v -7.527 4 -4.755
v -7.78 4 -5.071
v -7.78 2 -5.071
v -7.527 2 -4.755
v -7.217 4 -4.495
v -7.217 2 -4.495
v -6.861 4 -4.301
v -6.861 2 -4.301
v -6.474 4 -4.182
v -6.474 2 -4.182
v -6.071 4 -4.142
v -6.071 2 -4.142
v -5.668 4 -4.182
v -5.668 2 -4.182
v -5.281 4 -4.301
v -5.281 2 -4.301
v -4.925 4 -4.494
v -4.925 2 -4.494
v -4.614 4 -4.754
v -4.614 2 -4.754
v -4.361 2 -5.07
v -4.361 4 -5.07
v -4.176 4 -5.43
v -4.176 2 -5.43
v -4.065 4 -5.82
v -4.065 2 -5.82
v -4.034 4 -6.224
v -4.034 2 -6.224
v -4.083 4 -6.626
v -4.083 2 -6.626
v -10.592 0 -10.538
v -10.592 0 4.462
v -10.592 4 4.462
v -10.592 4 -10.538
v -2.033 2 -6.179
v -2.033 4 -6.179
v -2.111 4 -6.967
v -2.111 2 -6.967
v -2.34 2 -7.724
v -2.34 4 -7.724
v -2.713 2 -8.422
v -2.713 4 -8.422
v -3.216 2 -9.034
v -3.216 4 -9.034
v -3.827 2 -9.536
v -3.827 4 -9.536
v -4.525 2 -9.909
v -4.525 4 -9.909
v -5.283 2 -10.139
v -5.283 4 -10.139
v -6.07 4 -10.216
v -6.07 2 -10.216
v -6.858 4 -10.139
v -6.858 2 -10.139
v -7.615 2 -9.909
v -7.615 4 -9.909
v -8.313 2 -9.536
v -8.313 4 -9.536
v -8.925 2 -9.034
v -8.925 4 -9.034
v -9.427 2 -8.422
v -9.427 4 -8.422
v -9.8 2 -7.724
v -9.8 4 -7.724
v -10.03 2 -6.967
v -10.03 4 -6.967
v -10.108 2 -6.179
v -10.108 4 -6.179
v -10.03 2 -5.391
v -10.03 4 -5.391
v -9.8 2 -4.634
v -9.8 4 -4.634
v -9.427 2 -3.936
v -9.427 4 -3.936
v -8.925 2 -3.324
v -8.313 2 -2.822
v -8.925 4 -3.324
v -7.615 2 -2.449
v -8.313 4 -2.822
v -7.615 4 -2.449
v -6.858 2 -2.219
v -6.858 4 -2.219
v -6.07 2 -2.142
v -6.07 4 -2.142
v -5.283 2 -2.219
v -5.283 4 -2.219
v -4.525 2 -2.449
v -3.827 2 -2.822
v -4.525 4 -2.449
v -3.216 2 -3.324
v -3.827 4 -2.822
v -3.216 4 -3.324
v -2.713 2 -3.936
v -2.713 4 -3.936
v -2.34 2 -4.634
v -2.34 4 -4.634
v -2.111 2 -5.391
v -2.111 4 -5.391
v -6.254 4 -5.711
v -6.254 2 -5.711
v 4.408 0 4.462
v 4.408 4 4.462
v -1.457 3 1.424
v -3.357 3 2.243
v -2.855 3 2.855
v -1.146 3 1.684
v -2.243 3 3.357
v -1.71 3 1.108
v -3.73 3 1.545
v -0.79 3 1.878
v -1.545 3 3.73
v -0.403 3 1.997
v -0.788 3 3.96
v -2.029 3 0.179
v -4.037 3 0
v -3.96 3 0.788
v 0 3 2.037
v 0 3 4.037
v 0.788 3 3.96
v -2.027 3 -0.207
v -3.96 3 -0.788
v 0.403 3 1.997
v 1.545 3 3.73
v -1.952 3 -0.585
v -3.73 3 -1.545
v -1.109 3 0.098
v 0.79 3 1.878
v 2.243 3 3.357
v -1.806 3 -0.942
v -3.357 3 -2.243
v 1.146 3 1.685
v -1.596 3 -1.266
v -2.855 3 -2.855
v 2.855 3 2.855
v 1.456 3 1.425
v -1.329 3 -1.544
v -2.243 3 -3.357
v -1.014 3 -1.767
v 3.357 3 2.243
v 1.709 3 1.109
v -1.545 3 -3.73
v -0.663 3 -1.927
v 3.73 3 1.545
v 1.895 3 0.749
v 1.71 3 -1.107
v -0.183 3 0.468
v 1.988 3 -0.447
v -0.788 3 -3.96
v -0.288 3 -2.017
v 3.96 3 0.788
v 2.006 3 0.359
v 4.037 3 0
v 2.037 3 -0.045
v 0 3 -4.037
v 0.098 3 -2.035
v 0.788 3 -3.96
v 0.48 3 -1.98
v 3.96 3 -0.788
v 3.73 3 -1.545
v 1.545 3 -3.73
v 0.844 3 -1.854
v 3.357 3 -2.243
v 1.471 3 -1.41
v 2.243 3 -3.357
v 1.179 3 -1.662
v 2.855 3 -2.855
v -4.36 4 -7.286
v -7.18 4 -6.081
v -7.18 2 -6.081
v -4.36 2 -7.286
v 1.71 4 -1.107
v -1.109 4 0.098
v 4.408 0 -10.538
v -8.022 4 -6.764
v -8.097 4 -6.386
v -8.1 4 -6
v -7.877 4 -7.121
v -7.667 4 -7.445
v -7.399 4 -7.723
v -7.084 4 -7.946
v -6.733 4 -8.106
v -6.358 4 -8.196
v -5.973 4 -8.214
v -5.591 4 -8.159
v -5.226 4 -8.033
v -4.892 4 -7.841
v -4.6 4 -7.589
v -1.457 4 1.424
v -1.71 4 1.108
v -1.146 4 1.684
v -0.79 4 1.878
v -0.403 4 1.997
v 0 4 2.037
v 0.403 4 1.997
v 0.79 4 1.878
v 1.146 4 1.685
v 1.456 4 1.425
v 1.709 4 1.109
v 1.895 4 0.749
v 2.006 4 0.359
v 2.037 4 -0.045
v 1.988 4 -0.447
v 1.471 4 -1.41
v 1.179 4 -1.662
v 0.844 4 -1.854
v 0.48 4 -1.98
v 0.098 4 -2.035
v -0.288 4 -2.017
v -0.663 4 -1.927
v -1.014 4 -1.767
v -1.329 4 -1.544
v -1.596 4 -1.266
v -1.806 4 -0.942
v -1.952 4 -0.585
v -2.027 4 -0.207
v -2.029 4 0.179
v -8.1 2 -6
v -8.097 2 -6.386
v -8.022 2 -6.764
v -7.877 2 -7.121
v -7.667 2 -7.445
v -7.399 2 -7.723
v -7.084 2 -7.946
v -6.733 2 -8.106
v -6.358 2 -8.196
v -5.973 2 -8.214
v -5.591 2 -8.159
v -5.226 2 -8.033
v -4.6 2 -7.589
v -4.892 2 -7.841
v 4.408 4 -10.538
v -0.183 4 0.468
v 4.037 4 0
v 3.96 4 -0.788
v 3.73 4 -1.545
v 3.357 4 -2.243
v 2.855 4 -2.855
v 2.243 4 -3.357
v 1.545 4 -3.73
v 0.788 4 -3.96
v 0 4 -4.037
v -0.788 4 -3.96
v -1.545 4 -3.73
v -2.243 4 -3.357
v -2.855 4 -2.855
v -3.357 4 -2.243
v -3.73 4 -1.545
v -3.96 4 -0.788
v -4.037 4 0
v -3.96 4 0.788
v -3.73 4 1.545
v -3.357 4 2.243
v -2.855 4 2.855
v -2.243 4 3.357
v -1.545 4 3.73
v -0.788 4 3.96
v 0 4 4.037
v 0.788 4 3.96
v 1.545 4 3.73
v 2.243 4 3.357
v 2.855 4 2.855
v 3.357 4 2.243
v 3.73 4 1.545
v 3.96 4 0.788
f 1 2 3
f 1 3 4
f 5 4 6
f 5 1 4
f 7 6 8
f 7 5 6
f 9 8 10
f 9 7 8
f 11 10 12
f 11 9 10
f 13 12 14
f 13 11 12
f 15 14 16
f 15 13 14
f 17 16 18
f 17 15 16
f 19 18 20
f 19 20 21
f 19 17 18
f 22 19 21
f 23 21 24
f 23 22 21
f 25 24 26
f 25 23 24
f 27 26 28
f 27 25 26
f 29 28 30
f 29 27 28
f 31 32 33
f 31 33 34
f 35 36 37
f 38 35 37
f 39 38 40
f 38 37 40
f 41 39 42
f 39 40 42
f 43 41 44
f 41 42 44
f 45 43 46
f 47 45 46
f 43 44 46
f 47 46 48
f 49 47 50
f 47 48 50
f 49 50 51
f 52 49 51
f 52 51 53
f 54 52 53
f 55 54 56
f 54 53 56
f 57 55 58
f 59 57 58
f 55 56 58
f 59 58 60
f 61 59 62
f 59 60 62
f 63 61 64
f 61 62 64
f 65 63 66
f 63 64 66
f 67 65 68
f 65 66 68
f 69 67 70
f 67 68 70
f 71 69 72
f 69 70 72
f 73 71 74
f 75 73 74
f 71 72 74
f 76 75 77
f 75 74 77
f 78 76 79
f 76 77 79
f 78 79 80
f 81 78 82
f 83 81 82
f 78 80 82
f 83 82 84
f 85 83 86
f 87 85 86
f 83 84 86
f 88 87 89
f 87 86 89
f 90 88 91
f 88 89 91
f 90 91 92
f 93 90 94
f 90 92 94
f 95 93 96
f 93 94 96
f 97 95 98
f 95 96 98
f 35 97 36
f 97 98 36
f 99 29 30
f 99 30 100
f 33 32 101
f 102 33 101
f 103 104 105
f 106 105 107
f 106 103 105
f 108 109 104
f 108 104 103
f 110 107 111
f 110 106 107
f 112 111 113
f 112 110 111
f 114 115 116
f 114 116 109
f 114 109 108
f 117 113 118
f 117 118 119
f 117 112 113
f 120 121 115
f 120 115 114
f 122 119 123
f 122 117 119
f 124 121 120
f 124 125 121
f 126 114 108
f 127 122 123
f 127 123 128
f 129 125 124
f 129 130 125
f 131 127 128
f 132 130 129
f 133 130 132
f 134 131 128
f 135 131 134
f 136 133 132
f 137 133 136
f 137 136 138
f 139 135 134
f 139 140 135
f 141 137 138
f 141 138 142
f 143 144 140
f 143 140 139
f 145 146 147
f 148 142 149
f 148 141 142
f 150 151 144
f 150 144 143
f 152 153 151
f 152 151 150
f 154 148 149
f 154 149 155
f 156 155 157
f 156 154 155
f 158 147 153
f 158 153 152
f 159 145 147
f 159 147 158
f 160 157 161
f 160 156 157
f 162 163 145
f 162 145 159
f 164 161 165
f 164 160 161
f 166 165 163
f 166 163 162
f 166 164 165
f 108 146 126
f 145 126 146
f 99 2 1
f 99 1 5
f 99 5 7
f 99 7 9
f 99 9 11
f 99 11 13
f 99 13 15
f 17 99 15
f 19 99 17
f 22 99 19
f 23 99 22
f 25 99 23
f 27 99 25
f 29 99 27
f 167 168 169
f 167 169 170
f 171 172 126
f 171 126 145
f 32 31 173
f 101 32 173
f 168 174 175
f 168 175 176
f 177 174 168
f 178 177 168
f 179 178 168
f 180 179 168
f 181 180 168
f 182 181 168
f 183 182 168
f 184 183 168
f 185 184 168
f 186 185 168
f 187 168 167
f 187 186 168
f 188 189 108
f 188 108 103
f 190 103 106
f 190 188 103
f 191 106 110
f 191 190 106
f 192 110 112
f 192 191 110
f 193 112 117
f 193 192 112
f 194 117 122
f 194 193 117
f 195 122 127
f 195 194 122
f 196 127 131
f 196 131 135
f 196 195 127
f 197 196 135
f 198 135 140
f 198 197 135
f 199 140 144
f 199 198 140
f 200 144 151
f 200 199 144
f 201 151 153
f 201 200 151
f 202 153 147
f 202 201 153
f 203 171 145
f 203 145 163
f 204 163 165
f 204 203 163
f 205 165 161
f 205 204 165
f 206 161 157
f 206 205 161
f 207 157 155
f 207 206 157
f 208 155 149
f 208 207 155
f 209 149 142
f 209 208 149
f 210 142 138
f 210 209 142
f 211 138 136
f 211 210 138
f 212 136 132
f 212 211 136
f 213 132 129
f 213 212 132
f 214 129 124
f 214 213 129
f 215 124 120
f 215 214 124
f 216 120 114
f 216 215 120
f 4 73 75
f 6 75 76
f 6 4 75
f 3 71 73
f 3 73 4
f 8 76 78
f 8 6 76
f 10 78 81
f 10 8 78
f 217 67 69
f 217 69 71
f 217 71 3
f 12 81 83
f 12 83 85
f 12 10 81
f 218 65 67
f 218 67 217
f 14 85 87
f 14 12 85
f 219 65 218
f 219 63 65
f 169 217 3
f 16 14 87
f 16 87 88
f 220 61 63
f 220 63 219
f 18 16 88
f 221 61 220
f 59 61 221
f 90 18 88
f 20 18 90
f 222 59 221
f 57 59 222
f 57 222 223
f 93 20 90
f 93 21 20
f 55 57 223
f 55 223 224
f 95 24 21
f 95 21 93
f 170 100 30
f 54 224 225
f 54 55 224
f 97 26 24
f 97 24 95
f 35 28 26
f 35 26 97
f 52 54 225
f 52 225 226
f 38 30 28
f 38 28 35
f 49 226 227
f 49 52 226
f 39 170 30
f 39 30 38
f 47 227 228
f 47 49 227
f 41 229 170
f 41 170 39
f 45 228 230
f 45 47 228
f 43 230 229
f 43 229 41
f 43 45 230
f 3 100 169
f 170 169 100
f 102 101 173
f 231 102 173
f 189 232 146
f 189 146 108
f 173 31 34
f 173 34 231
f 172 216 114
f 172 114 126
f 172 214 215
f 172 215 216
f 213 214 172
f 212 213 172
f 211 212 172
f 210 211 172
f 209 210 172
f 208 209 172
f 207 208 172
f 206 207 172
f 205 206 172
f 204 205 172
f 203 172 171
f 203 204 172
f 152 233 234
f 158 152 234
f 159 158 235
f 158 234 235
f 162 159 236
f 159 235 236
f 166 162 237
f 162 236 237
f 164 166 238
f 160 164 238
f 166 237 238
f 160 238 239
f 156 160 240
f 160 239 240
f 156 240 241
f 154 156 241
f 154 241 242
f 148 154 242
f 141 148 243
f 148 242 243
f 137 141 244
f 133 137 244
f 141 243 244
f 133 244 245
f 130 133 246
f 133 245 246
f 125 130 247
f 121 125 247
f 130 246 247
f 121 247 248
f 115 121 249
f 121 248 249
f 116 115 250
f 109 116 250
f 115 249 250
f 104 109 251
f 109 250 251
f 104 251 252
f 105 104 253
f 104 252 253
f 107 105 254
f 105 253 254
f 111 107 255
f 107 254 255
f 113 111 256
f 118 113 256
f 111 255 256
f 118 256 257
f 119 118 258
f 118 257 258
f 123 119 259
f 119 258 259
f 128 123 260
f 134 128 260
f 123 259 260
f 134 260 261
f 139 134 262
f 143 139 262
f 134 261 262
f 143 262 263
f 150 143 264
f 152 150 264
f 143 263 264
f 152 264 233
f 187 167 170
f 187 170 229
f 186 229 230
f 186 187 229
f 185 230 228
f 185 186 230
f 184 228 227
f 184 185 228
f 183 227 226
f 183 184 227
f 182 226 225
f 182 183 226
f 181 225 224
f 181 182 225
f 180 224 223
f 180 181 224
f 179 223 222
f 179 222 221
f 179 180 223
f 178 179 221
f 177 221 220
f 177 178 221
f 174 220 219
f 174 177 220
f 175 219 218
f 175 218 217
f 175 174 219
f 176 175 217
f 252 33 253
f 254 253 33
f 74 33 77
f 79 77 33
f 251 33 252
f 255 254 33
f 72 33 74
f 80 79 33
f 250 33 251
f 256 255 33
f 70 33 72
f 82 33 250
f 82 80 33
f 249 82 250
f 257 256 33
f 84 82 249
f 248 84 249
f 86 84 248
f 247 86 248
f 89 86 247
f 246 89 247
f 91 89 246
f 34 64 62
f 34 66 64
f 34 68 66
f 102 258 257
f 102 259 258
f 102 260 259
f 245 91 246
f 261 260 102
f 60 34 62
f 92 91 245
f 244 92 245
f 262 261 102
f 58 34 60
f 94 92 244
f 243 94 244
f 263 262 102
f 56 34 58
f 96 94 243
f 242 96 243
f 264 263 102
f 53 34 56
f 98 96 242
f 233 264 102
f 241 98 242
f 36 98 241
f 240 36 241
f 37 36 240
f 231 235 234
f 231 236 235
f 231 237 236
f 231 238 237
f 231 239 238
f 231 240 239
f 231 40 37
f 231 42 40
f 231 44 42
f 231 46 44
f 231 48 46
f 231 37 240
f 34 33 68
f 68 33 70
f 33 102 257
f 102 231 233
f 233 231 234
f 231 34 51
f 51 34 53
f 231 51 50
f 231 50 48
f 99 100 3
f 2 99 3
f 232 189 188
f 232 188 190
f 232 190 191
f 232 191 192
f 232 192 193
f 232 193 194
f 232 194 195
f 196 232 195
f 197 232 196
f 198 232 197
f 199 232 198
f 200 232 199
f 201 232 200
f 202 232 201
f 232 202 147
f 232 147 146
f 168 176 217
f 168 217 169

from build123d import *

# Parameters (mm, degrees)
SKETCH1_W           = 15
SKETCH1_H           = 15
BOSS_EXTRUDE1_DEPTH = 4
SKETCH3_R           = 4.037394367
CUT_EXTRUDE2_DEPTH  = 1
SKETCH2_R           = 4.037394367
CUT_EXTRUDE3_DEPTH  = 2


with BuildPart() as part:
    # Sketch1 → Boss-Extrude1 (new body)
    with BuildSketch(Plane(origin=(0, 0, 0), x_dir=(1, 0, 0), z_dir=(0, 1, 0))):
        with Locations((-3.092315207, 3.037793064)):
            Rectangle(SKETCH1_W, SKETCH1_H)
    extrude(amount=BOSS_EXTRUDE1_DEPTH)

    # Sketch3 → Cut-Extrude2 (cut)
    with BuildSketch(Plane(origin=(0, 4, 0), x_dir=(1, 0, 0), z_dir=(0, 1, 0))):
        Circle(SKETCH3_R)
        with BuildLine():
            Line((-2.029498636, -0.179195686), (-1.109423018, -0.097957109))
            Line((-1.109423018, -0.097957109), (1.710275386, 1.107218999))
            ThreePointArc((1.710275386, 1.107218999), (-0.662715291, 1.926599141), (-2.029498636, -0.179195686))
        make_face(mode=Mode.SUBTRACT)
        with BuildLine():
            Line((1.987822429, 0.44669654), (-0.18326754, -0.467866029))
            Line((-0.18326754, -0.467866029), (-1.709632143, -1.108211957))
            ThreePointArc((-1.709632143, -1.108211957), (0.789799068, -1.87808233), (1.987822429, 0.44669654))
        make_face(mode=Mode.SUBTRACT)
    extrude(amount=-CUT_EXTRUDE2_DEPTH, mode=Mode.SUBTRACT)

    # Sketch2 → Cut-Extrude3 (cut)
    with BuildSketch(Plane(origin=(0, 4, 0), x_dir=(1, 0, 0), z_dir=(0, 1, 0))):
        with Locations((-6.070431837, 6.178975723)):
            Circle(SKETCH2_R)
        with BuildLine():
            Line((-8.099930473, 5.999780036), (-7.179854855, 6.081018614))
            Line((-7.179854855, 6.081018614), (-4.360156451, 7.286194722))
            ThreePointArc((-4.360156451, 7.286194722), (-6.733147128, 8.105574864), (-8.099930473, 5.999780036))
        make_face(mode=Mode.SUBTRACT)
        with BuildLine():
            Line((-4.082609408, 6.625672263), (-6.253699377, 5.711109693))
            Line((-6.253699377, 5.711109693), (-7.78006398, 5.070763766))
            ThreePointArc((-7.78006398, 5.070763766), (-5.280632769, 4.300893392), (-4.082609408, 6.625672263))
        make_face(mode=Mode.SUBTRACT)
    extrude(amount=-CUT_EXTRUDE3_DEPTH, mode=Mode.SUBTRACT)


solid = part.part
